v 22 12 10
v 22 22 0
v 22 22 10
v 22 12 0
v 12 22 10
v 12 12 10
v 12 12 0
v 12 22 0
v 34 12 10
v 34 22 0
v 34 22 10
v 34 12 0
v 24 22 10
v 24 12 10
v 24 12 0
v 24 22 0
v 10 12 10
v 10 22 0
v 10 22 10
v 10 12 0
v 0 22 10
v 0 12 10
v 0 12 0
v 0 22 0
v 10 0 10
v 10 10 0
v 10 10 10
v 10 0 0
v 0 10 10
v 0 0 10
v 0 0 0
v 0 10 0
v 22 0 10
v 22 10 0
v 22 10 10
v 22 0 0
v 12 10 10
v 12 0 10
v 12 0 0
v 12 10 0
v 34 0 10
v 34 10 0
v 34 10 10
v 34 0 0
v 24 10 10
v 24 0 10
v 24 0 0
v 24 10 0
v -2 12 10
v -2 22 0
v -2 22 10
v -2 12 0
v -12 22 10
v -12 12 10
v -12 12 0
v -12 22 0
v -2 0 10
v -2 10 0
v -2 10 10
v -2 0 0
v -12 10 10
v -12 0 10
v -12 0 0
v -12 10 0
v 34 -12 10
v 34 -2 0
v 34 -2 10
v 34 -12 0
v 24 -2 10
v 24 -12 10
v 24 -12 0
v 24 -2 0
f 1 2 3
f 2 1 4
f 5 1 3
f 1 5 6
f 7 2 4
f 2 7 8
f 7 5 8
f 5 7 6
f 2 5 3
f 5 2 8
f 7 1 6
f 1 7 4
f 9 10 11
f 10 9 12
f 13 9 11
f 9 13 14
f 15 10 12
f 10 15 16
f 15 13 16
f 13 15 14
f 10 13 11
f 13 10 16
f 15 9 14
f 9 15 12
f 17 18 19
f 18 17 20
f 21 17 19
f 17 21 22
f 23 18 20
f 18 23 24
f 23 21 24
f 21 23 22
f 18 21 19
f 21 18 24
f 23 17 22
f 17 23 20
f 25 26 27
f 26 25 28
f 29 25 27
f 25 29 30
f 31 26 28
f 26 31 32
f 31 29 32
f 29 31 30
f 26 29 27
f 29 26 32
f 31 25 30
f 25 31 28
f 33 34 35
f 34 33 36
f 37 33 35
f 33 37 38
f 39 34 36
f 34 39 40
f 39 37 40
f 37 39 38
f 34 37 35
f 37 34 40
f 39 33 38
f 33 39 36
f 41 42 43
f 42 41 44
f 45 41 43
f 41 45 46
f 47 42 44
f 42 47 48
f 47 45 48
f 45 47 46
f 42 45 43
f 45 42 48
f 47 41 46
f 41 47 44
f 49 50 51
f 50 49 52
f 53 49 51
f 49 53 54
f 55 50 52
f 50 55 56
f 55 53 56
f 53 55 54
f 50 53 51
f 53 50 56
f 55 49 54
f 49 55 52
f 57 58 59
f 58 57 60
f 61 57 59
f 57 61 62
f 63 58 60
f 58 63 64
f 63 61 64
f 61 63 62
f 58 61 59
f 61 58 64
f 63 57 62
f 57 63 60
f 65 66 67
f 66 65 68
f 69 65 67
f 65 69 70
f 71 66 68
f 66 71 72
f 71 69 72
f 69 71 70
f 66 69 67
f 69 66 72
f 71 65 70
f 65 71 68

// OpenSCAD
// Empty
color();
// No children
color() { }

module object() cube([10,10,10]);

translate([12,12,0]) object();
color([1,0,0]) translate([24,12,0]) object();
translate([0,12,0]) color("Purple") object();
color([0,0,1,0.5]) object();
translate([12,0,0]) color([0,0,1],0.5) object();
translate([24,0,0]) color(c="Green",alpha=0.2) object();
translate([-12,12,0]) color() object();
translate([-12,0,0]) color(alpha=0.5) object();
translate([24,-12,0]) color([1,0,0]) color([0,0,1]) object();
